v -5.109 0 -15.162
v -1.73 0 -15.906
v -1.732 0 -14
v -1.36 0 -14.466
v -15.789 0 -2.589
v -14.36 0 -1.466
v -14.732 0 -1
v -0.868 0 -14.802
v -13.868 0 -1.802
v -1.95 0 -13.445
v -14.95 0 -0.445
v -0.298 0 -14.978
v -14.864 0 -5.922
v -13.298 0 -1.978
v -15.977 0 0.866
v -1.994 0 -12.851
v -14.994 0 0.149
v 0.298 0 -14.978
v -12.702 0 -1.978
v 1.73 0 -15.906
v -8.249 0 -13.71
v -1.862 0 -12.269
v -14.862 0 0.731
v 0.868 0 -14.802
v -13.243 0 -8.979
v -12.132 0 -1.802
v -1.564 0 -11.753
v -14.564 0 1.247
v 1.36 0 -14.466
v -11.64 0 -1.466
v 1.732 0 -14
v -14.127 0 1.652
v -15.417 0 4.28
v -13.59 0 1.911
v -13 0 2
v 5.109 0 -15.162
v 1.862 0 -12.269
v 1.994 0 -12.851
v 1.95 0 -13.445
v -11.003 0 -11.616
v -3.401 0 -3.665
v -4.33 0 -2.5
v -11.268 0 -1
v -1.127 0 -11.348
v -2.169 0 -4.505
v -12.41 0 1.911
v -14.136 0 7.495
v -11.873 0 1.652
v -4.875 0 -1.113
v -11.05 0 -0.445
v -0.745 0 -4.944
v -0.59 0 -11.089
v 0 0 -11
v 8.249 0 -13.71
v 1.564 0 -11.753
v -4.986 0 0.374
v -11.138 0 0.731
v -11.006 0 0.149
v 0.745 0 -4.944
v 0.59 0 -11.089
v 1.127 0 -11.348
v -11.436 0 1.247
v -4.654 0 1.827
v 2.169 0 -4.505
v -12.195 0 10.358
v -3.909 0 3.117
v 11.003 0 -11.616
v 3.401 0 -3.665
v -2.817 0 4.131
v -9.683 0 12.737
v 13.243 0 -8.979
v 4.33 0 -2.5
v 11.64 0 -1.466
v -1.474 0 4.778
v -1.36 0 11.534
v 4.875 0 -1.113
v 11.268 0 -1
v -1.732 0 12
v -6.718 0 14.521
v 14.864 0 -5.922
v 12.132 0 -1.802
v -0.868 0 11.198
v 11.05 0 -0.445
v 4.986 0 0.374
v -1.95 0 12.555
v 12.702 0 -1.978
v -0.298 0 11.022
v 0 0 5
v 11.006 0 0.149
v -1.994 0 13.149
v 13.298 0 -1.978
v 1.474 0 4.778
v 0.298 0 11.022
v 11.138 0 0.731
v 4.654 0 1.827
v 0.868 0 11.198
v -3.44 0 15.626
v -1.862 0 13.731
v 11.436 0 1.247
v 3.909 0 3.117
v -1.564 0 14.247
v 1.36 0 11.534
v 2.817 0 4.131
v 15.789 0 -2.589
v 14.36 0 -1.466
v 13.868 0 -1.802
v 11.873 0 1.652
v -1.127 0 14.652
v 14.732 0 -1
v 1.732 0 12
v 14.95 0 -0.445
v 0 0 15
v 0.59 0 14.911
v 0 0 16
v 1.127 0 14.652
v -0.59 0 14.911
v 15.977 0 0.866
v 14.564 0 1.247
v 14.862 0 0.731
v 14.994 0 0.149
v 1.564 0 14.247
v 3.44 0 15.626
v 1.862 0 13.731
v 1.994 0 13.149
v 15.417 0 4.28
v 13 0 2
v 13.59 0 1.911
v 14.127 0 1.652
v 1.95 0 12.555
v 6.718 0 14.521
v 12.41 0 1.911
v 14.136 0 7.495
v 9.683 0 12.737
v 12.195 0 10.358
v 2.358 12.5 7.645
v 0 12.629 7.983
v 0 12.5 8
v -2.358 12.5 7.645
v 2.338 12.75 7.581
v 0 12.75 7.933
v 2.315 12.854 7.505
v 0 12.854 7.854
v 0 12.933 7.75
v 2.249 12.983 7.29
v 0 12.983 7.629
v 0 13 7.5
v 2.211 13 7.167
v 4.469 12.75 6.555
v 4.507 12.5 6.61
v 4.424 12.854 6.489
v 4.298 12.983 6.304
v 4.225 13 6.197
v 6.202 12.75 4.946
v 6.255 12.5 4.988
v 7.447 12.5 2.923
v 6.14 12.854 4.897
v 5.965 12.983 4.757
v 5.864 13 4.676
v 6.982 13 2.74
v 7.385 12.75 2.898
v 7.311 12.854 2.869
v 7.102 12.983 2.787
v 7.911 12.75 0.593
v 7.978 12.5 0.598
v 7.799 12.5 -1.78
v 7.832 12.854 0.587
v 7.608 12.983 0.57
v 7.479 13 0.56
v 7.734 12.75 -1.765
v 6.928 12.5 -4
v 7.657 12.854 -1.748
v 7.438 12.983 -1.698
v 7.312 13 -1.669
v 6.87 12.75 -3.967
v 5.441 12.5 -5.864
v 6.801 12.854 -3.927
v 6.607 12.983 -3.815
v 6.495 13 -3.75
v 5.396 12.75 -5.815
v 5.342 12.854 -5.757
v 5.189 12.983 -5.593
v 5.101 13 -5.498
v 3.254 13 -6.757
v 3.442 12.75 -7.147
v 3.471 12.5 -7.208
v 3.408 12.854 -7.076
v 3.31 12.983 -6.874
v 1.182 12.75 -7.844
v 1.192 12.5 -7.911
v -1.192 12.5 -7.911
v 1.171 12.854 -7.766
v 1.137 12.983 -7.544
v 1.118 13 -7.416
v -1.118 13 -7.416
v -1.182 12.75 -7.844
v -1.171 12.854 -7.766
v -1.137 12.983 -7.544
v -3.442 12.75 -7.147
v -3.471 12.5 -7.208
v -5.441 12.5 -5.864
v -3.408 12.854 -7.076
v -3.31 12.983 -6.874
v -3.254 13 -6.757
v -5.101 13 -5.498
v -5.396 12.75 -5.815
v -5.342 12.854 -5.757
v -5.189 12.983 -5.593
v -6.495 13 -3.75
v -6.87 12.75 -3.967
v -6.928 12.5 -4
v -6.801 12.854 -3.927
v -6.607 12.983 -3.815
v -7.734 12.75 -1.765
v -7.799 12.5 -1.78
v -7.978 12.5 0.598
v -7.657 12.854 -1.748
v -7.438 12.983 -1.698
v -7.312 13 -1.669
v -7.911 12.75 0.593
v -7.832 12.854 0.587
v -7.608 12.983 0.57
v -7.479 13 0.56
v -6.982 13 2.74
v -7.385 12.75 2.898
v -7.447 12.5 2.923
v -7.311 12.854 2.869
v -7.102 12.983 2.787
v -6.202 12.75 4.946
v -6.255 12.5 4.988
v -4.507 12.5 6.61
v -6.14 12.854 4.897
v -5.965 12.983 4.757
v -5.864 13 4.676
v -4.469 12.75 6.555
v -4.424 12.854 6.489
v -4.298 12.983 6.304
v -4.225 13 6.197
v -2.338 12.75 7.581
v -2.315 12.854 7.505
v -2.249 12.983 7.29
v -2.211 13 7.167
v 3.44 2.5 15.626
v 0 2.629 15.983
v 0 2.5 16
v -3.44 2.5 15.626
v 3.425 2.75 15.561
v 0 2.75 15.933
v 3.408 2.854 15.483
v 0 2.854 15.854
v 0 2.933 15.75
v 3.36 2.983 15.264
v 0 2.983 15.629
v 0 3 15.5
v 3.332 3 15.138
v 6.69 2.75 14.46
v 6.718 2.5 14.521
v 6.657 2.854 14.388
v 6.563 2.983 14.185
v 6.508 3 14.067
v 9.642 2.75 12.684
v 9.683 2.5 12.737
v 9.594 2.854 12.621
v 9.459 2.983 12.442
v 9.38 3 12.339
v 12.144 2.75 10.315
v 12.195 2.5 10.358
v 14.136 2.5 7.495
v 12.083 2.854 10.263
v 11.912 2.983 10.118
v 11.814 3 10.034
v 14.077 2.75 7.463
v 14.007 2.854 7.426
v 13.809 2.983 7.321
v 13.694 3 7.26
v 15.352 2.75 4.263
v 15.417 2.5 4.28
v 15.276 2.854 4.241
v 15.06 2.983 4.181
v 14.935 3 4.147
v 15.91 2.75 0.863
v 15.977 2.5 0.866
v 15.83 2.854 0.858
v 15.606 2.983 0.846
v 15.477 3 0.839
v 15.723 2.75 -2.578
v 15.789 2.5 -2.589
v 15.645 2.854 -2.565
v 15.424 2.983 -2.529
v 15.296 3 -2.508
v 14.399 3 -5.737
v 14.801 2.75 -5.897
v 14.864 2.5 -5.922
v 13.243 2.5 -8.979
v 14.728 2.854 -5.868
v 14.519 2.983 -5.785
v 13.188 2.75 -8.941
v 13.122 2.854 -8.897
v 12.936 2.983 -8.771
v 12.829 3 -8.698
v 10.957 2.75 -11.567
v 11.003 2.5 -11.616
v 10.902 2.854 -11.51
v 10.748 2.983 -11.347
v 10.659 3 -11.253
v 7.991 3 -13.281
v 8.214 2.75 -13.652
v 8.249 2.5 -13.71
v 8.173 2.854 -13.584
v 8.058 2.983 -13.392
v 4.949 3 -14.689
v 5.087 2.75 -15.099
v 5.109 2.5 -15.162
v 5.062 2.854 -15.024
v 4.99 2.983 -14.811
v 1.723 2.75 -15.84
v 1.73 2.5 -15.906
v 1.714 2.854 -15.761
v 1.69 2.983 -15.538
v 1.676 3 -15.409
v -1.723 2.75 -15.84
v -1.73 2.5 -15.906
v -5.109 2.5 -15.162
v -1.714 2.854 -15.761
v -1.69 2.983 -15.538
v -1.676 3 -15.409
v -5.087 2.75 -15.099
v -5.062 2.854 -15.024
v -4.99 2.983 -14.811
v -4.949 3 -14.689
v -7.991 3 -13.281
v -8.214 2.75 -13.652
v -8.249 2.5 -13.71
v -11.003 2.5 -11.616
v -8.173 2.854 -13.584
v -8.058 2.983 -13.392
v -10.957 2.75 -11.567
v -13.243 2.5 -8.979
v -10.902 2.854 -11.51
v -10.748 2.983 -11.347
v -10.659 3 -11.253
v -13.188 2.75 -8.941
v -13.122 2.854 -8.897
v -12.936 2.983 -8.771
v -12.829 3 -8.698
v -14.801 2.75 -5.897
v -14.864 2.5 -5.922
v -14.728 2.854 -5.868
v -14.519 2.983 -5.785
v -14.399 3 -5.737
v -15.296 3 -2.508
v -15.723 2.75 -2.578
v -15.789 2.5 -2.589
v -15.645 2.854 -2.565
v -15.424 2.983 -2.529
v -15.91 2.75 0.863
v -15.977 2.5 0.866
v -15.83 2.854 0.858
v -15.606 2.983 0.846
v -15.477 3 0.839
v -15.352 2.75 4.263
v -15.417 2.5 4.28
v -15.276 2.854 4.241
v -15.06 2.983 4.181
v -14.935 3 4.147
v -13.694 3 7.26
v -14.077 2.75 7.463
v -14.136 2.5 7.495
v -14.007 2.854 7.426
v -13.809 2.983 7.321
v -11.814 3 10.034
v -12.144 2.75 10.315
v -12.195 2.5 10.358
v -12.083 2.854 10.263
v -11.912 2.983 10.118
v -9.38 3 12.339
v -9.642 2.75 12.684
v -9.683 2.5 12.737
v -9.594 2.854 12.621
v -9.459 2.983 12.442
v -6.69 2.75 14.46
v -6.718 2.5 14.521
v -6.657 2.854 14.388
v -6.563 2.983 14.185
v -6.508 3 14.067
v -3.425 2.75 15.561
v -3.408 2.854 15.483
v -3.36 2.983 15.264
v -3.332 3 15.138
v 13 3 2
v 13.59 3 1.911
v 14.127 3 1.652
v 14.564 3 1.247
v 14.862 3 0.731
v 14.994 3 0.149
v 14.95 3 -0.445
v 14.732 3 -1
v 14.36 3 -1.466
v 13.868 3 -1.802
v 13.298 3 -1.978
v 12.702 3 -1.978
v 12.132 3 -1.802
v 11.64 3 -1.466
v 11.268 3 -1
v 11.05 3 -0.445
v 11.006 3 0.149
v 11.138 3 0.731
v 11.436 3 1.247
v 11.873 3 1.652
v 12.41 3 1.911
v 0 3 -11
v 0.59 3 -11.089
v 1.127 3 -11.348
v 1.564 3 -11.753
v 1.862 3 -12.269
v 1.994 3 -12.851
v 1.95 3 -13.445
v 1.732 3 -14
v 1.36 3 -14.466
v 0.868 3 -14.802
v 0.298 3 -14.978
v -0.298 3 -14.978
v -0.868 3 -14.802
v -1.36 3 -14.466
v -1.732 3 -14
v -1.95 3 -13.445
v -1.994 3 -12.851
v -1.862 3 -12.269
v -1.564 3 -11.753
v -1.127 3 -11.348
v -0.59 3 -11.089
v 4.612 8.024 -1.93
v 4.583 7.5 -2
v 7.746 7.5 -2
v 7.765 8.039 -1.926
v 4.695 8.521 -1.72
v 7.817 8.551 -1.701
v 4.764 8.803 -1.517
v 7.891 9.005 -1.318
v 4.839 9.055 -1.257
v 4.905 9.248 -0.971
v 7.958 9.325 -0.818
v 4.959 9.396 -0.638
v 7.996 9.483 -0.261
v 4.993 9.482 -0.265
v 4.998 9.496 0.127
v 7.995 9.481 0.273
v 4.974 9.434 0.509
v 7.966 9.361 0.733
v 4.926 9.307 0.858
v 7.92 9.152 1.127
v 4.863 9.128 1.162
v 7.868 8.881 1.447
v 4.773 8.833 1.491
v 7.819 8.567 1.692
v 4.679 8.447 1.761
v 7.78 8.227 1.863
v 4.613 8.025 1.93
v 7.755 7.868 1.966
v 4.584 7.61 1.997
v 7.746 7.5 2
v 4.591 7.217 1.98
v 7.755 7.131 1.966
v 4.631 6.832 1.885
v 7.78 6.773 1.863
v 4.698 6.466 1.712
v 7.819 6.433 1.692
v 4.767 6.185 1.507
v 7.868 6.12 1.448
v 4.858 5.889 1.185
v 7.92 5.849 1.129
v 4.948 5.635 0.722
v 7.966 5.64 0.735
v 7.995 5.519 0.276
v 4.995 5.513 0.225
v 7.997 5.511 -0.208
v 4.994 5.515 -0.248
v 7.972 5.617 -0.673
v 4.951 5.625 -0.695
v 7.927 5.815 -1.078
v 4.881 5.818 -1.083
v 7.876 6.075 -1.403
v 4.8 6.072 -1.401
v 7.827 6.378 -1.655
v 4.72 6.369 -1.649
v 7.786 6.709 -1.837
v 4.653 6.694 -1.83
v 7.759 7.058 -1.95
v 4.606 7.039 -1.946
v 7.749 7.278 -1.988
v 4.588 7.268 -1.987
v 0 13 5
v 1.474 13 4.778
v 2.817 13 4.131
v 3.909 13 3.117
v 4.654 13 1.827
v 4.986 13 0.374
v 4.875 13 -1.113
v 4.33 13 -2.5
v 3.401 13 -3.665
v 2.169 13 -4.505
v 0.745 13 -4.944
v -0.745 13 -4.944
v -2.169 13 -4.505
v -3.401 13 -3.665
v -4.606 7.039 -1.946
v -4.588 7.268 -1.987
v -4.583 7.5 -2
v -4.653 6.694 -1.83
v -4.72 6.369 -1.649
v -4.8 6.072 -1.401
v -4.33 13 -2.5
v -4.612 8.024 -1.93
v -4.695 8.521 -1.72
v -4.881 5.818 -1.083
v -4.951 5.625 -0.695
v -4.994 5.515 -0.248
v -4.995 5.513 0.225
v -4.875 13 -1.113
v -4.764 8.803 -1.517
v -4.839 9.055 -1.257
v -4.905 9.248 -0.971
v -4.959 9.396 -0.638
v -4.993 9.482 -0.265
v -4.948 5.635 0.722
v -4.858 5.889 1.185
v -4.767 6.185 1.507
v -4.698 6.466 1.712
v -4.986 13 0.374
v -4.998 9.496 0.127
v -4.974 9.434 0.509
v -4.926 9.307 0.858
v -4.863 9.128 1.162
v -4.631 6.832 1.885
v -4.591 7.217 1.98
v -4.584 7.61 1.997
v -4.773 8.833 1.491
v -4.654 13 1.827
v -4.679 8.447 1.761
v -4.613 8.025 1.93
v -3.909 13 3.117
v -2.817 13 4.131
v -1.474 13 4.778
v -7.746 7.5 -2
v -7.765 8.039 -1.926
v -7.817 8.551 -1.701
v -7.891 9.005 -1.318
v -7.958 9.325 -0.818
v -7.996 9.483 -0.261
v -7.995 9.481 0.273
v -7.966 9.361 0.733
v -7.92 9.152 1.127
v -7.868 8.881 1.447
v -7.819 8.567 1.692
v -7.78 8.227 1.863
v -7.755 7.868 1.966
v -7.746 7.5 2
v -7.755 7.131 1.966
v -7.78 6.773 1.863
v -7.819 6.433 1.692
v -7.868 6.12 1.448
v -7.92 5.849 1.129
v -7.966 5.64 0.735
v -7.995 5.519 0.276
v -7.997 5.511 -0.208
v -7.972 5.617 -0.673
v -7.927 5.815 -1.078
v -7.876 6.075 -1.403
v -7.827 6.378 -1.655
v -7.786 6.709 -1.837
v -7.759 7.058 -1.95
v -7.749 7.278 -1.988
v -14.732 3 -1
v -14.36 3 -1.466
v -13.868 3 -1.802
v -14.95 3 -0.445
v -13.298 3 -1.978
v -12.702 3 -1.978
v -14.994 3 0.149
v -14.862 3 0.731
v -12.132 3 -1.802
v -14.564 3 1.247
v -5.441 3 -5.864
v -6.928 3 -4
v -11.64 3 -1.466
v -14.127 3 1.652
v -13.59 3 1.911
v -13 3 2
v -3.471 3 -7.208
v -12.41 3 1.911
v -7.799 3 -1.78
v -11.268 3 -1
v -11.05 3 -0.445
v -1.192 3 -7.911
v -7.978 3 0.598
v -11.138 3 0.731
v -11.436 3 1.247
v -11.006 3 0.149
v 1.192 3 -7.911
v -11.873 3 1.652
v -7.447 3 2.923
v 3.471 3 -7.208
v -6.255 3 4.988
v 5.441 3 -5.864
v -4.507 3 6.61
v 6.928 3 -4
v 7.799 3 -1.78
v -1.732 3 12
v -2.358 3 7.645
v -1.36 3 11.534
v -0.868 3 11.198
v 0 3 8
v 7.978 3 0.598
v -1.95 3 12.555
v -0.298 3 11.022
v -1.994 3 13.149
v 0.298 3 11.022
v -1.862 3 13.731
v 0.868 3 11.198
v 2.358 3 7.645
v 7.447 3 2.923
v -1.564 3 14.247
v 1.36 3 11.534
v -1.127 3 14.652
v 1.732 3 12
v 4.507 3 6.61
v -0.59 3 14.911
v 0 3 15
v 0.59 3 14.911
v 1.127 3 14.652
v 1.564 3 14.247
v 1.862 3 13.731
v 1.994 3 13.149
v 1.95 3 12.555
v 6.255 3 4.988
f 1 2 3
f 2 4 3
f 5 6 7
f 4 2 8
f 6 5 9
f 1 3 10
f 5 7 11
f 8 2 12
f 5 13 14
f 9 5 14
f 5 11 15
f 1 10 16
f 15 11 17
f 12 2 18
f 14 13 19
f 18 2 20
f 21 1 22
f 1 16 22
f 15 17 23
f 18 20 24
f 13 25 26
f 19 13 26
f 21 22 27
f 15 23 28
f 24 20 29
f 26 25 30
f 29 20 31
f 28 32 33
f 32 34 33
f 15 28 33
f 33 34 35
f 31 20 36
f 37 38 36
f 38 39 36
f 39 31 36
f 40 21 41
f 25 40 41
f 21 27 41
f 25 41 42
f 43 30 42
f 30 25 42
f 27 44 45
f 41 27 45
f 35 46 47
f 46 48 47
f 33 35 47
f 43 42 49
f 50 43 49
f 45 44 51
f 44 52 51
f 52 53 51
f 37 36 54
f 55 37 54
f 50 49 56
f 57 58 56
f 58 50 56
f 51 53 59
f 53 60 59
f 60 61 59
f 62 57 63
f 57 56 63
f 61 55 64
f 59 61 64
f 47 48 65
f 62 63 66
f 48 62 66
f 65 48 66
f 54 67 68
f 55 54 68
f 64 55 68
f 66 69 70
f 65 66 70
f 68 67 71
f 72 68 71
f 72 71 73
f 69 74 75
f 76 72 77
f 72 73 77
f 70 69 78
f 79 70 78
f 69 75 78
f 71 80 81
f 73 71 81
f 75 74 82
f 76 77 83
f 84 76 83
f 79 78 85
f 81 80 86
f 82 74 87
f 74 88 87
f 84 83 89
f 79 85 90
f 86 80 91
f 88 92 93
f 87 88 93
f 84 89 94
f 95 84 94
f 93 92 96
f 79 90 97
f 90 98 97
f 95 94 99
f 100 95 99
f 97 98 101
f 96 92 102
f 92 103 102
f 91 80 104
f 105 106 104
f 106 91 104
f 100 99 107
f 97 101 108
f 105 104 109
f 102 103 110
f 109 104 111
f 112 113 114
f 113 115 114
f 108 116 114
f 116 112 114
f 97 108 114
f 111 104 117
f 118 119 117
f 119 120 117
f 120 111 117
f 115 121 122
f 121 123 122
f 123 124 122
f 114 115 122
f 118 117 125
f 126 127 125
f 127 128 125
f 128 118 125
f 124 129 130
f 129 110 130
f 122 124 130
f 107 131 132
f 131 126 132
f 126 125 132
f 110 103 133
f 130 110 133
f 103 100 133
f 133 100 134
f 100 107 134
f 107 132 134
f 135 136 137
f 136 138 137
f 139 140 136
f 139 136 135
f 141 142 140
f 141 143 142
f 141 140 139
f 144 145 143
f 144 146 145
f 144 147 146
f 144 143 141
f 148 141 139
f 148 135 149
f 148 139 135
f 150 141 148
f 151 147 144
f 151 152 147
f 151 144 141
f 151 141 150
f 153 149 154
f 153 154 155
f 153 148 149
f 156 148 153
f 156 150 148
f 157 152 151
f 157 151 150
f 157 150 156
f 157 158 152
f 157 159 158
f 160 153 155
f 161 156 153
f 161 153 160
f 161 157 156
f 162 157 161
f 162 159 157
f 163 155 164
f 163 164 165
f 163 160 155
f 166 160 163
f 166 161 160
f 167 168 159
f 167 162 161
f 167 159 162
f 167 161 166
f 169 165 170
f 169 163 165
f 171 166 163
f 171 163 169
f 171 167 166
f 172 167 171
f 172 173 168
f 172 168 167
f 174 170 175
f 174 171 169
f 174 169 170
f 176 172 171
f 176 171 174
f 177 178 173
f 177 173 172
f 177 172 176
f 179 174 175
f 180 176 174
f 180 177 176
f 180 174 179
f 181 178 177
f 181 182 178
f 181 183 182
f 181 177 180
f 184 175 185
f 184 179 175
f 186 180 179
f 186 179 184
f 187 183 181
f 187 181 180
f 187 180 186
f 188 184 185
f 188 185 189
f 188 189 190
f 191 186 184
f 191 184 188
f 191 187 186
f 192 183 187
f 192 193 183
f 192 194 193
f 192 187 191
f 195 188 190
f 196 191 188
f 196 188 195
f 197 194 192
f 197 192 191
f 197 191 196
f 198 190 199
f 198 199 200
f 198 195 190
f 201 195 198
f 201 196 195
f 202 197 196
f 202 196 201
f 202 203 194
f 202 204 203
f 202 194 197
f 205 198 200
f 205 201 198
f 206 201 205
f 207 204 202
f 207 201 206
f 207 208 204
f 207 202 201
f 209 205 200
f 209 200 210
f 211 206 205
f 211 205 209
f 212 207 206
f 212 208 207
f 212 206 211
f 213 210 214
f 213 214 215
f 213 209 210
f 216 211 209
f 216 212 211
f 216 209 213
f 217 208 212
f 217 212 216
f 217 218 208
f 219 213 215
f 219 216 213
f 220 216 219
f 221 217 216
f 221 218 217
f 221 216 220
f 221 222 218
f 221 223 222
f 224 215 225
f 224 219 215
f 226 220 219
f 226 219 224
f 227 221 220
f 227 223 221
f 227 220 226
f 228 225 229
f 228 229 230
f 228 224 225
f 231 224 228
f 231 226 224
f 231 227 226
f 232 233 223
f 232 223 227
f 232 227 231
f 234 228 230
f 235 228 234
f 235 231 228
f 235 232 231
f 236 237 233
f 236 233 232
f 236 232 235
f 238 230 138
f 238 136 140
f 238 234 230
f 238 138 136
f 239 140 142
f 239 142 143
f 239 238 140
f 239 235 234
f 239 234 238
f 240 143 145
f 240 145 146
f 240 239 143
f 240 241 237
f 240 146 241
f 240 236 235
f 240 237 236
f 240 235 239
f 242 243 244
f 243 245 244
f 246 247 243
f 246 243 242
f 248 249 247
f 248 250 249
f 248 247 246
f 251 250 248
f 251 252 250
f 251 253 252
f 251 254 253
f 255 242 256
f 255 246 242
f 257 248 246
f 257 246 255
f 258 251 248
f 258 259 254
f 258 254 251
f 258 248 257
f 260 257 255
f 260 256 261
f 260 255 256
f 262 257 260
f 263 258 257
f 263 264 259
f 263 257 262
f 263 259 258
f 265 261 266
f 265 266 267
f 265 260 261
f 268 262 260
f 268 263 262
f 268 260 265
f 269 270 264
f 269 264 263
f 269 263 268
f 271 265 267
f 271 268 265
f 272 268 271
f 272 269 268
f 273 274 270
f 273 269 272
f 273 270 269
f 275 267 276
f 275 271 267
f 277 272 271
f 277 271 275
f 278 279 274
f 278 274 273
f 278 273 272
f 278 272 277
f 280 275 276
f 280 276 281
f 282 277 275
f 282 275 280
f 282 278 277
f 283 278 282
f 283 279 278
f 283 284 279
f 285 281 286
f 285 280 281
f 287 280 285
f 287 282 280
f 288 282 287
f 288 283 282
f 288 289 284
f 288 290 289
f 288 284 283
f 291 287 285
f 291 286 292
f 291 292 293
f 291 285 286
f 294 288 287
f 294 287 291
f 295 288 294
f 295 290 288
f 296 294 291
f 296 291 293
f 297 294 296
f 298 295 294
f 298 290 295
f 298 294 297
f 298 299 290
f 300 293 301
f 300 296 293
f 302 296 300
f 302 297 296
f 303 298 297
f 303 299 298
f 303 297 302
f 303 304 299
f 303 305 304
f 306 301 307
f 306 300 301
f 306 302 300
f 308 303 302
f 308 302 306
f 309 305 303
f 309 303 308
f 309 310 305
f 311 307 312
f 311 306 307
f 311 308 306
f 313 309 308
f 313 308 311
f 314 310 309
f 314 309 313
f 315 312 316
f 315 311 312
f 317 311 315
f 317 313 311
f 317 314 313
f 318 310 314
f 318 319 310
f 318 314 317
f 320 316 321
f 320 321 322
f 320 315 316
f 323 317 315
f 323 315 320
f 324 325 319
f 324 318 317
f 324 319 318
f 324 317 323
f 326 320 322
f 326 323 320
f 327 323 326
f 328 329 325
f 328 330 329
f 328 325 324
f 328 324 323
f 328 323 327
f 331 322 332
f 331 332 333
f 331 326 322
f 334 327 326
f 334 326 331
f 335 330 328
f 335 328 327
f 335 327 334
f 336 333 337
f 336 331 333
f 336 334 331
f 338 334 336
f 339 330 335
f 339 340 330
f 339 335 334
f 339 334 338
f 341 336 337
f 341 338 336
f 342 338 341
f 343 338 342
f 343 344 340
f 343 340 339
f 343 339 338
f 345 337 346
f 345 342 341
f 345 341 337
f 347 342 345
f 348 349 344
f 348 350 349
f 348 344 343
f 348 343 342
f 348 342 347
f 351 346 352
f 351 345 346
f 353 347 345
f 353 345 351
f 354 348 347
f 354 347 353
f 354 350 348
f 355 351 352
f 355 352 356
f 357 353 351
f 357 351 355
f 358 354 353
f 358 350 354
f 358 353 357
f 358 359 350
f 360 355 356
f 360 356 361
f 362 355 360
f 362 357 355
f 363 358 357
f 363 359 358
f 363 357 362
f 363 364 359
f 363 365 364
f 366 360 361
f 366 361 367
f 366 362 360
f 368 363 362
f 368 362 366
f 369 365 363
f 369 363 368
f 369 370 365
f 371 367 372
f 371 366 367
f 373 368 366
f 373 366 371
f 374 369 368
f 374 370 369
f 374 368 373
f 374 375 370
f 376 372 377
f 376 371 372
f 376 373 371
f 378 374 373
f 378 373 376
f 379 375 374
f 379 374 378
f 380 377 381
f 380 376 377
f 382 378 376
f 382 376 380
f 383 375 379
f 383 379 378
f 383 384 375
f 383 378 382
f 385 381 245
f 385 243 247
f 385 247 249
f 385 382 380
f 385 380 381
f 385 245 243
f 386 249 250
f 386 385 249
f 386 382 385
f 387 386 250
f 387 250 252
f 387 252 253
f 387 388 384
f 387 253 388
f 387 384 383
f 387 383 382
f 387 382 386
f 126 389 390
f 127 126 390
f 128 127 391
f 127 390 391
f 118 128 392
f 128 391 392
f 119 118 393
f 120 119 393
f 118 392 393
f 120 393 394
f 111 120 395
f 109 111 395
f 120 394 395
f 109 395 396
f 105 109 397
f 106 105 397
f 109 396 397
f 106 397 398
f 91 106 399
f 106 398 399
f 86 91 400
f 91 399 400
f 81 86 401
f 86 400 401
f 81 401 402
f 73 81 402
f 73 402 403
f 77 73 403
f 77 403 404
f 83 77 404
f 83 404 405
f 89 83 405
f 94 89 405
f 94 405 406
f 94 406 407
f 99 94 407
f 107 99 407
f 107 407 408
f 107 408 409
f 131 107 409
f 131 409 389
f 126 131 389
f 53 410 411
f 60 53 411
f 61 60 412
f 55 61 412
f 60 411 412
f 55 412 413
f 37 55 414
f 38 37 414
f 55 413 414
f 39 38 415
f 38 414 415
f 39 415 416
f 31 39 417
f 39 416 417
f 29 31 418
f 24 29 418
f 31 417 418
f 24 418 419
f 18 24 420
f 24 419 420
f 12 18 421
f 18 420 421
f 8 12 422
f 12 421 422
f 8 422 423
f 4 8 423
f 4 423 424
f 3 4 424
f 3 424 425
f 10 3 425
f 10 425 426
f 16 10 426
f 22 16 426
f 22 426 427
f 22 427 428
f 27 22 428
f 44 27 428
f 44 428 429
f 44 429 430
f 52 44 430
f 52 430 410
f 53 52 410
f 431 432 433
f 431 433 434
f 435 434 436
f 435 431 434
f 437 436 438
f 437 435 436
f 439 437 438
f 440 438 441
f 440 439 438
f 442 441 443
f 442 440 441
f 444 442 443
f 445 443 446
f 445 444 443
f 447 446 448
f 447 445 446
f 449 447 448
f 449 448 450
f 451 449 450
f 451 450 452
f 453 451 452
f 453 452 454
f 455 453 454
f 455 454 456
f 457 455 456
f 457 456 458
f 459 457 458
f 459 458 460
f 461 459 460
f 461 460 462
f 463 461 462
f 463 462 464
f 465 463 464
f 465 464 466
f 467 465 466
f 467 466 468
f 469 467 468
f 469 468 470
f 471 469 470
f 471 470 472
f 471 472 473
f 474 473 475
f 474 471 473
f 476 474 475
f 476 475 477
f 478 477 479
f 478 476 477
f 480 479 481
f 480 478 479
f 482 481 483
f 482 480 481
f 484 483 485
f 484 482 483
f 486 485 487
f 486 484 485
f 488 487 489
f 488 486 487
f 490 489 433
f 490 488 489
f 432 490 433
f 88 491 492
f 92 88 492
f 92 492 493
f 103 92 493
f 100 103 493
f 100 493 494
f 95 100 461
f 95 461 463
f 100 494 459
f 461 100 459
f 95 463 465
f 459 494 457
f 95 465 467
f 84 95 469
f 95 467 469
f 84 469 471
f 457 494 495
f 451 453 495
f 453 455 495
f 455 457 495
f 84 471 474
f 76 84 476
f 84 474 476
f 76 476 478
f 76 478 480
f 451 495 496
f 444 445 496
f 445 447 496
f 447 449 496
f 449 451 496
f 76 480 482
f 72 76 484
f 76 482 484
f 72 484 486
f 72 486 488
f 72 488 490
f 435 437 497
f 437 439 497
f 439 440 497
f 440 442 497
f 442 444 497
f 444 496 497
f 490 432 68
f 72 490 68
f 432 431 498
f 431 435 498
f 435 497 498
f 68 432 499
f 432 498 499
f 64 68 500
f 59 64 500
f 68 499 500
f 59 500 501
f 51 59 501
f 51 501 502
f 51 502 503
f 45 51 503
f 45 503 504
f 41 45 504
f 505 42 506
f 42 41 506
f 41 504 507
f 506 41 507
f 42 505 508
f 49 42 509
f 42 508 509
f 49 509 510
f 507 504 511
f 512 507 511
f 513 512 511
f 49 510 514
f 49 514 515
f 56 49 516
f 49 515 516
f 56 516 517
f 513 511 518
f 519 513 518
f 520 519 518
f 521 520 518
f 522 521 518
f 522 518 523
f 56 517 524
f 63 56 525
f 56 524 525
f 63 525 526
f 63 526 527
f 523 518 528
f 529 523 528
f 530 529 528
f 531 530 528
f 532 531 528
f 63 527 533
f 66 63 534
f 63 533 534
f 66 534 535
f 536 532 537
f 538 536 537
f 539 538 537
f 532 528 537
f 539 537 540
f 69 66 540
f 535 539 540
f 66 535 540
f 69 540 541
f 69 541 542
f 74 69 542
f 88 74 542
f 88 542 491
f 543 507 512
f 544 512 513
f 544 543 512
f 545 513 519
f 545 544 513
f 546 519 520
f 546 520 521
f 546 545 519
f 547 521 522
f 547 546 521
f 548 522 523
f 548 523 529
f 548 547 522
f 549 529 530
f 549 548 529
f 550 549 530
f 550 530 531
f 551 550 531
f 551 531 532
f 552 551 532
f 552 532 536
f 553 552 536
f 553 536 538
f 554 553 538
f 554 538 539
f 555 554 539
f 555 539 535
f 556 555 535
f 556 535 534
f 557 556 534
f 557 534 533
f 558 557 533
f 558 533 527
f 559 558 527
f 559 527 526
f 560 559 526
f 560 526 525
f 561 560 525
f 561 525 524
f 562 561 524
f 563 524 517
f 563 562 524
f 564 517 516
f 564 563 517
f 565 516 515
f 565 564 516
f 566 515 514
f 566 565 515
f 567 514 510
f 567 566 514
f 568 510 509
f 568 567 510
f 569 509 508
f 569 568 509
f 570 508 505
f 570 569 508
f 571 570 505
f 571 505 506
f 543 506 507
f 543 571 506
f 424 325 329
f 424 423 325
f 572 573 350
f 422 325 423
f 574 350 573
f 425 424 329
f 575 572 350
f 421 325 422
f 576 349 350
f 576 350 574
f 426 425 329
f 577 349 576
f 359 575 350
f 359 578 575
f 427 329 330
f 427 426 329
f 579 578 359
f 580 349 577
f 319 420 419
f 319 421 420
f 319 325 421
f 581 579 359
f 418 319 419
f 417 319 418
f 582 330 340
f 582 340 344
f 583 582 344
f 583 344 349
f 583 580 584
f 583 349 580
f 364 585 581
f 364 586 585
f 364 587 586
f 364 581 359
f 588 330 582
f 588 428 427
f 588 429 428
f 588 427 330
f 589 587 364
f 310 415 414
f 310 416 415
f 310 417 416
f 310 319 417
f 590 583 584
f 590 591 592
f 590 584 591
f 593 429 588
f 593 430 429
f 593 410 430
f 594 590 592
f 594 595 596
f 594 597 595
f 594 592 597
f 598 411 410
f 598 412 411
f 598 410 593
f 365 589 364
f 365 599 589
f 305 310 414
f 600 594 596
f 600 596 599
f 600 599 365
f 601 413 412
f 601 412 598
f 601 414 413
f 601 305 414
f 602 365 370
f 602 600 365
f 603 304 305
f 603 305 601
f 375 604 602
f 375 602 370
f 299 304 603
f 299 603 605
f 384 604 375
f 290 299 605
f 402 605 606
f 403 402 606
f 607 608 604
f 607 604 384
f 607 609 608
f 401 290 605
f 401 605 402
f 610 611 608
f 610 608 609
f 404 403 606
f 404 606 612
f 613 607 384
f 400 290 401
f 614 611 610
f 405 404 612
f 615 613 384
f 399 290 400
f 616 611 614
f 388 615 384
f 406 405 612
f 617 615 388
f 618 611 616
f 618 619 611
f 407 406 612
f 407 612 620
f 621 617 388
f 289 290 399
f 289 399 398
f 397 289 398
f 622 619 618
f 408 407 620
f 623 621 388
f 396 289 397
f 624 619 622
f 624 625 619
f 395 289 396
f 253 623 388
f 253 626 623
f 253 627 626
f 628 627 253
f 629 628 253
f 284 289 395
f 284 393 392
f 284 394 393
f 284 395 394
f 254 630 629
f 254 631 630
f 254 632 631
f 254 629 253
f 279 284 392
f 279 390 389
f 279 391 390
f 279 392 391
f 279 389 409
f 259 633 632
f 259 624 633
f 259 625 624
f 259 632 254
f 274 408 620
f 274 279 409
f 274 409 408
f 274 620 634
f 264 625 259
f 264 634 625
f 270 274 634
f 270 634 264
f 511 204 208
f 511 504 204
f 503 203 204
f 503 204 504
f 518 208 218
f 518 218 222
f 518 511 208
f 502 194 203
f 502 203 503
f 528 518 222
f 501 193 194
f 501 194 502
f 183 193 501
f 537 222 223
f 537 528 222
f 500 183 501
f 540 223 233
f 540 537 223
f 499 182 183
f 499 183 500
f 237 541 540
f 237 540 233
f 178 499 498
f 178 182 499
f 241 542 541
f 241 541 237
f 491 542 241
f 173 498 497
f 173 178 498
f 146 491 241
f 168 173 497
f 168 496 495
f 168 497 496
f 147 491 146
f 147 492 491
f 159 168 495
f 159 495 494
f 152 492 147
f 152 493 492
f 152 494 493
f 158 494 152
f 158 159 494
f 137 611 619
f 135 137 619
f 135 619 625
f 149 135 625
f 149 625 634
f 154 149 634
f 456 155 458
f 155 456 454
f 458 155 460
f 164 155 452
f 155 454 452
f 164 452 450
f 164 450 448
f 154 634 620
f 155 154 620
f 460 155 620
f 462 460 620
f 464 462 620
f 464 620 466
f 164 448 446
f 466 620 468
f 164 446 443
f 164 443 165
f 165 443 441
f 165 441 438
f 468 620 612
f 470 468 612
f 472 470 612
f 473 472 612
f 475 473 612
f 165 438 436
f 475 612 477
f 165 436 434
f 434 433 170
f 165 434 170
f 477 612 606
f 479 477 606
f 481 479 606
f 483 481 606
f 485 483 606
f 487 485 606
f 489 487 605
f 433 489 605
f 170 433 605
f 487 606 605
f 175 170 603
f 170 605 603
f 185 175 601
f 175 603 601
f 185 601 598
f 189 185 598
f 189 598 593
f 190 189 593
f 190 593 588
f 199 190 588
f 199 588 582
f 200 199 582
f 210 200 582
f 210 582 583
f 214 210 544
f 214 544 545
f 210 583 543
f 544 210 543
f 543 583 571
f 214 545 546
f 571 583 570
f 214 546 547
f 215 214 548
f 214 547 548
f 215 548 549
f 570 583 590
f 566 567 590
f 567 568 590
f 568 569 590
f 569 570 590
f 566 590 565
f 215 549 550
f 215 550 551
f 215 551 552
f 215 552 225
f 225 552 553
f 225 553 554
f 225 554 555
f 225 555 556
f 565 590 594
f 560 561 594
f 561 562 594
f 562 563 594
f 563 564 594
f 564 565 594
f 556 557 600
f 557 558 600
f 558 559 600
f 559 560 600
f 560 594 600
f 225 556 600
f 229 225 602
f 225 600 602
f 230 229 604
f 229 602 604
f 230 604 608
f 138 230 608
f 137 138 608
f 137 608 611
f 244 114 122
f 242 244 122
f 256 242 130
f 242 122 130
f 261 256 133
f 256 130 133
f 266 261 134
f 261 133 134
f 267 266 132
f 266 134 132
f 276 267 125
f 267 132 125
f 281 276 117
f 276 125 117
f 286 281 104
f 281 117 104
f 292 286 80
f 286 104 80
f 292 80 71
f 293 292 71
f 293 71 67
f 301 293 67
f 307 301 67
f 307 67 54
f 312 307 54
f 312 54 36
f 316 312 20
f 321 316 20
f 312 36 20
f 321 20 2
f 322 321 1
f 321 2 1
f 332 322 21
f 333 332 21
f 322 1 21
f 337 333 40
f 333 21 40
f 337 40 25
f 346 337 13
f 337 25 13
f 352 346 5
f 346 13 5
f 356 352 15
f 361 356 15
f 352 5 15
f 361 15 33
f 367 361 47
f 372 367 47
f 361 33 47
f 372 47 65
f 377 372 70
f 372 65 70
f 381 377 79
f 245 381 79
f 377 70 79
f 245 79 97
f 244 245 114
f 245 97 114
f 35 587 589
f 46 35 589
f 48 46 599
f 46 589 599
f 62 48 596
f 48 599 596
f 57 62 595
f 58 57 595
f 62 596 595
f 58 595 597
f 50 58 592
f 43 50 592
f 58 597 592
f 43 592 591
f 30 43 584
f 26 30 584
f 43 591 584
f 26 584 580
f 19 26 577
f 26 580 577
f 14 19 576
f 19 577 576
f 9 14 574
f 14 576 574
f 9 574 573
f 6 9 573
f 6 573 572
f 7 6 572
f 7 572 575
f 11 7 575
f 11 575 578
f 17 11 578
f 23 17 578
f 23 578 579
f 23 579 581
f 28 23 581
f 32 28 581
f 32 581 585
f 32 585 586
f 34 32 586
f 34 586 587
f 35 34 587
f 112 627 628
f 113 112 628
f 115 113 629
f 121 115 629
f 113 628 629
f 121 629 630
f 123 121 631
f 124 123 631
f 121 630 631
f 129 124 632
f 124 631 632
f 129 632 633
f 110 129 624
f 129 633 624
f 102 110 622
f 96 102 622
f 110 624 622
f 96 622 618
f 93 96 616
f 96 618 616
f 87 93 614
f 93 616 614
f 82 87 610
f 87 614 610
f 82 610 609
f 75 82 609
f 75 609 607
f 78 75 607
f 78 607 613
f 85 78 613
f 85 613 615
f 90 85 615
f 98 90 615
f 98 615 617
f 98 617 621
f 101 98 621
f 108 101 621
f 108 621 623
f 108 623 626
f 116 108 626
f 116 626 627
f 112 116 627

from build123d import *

# Parameters (mm, degrees)
SKETCH_1_R               = 16
EXTRUDE_1_DEPTH          = 3
SKETCH_2_R               = 8
EXTRUDE_2_DEPTH          = 10
SKETCH_3_R               = 5
CUT_EXTRUDE_1_DEPTH      = 27.095976701
SKETCH_4_R               = 2
CUT_EXTRUDE_2_DEPTH      = 7
CUT_EXTRUDE_3_DEPTH      = 27.095976701
CUT_EXTRUDE_3_DEPTH_BACK = 27.095976701
SKETCH_5_R               = 2
FILLET_1_R               = 0.5
FILLET_2_R               = 0.5


with BuildPart() as part:
    # 草图1 → 凸台-拉伸1 (new body)
    with BuildSketch(Plane(origin=(0, 0, 0), x_dir=(1, 0, 0), z_dir=(0, 1, 0))):
        with Locations(Location((0, 0, 0), (0, 0, 270))):
            Circle(SKETCH_1_R)
    extrude(amount=EXTRUDE_1_DEPTH)

    # 草图2 → 凸台-拉伸2 (add)
    with BuildSketch(Plane(origin=(0, 3, 0), x_dir=(1, 0, 0), z_dir=(0, 1, 0))):
        with Locations(Location((0, 0, 0), (0, 0, 270))):
            Circle(SKETCH_2_R)
    extrude(amount=EXTRUDE_2_DEPTH)

    # 草图3 → 切除-拉伸1 (cut, through all)
    with BuildSketch(Plane(origin=(0, 13, 0), x_dir=(1, 0, 0), z_dir=(0, 1, 0))):
        with Locations(Location((0, 0, 0), (0, 0, 270))):
            Circle(SKETCH_3_R)
    extrude(amount=-CUT_EXTRUDE_1_DEPTH, mode=Mode.SUBTRACT)

    # 草图4 → 切除-拉伸2 (cut)
    with BuildSketch(Plane(origin=(0, 3, 0), x_dir=(1, 0, 0), z_dir=(0, 1, 0))):
        with Locations(Location((0, 13, 0), (0, 0, 270))):
            Circle(SKETCH_4_R)
        with Locations(Location((-13, 0, 0), (0, 0, 270))):
            Circle(SKETCH_4_R)
        with Locations(Location((0, -13, 0), (0, 0, 270))):
            Circle(SKETCH_4_R)
        with Locations(Location((13, 0, 0), (0, 0, 270))):
            Circle(SKETCH_4_R)
    extrude(amount=-CUT_EXTRUDE_2_DEPTH, mode=Mode.SUBTRACT)

    # 草图5 → 切除-拉伸3 (cut, two sides: drawn at the far end of the back side and taken through both)
    with BuildSketch(Plane(origin=(0, 0, 0), x_dir=(0, 0, -1), z_dir=(1, 0, 0)).offset(-CUT_EXTRUDE_3_DEPTH_BACK)):
        with Locations((0, 7.5)):
            Circle(SKETCH_5_R)
    extrude(amount=CUT_EXTRUDE_3_DEPTH + CUT_EXTRUDE_3_DEPTH_BACK, mode=Mode.SUBTRACT)

    # 圆角1
    fillet_1_edges = [part.edges().sort_by_distance(p)[0] for p in [
        (0, 3, -16),
    ]]
    fillet(fillet_1_edges, radius=FILLET_1_R)

    # 圆角2
    fillet_2_edges = [part.edges().sort_by_distance(p)[0] for p in [
        (0, 13, -8),
    ]]
    fillet(fillet_2_edges, radius=FILLET_2_R)


solid = part.part
